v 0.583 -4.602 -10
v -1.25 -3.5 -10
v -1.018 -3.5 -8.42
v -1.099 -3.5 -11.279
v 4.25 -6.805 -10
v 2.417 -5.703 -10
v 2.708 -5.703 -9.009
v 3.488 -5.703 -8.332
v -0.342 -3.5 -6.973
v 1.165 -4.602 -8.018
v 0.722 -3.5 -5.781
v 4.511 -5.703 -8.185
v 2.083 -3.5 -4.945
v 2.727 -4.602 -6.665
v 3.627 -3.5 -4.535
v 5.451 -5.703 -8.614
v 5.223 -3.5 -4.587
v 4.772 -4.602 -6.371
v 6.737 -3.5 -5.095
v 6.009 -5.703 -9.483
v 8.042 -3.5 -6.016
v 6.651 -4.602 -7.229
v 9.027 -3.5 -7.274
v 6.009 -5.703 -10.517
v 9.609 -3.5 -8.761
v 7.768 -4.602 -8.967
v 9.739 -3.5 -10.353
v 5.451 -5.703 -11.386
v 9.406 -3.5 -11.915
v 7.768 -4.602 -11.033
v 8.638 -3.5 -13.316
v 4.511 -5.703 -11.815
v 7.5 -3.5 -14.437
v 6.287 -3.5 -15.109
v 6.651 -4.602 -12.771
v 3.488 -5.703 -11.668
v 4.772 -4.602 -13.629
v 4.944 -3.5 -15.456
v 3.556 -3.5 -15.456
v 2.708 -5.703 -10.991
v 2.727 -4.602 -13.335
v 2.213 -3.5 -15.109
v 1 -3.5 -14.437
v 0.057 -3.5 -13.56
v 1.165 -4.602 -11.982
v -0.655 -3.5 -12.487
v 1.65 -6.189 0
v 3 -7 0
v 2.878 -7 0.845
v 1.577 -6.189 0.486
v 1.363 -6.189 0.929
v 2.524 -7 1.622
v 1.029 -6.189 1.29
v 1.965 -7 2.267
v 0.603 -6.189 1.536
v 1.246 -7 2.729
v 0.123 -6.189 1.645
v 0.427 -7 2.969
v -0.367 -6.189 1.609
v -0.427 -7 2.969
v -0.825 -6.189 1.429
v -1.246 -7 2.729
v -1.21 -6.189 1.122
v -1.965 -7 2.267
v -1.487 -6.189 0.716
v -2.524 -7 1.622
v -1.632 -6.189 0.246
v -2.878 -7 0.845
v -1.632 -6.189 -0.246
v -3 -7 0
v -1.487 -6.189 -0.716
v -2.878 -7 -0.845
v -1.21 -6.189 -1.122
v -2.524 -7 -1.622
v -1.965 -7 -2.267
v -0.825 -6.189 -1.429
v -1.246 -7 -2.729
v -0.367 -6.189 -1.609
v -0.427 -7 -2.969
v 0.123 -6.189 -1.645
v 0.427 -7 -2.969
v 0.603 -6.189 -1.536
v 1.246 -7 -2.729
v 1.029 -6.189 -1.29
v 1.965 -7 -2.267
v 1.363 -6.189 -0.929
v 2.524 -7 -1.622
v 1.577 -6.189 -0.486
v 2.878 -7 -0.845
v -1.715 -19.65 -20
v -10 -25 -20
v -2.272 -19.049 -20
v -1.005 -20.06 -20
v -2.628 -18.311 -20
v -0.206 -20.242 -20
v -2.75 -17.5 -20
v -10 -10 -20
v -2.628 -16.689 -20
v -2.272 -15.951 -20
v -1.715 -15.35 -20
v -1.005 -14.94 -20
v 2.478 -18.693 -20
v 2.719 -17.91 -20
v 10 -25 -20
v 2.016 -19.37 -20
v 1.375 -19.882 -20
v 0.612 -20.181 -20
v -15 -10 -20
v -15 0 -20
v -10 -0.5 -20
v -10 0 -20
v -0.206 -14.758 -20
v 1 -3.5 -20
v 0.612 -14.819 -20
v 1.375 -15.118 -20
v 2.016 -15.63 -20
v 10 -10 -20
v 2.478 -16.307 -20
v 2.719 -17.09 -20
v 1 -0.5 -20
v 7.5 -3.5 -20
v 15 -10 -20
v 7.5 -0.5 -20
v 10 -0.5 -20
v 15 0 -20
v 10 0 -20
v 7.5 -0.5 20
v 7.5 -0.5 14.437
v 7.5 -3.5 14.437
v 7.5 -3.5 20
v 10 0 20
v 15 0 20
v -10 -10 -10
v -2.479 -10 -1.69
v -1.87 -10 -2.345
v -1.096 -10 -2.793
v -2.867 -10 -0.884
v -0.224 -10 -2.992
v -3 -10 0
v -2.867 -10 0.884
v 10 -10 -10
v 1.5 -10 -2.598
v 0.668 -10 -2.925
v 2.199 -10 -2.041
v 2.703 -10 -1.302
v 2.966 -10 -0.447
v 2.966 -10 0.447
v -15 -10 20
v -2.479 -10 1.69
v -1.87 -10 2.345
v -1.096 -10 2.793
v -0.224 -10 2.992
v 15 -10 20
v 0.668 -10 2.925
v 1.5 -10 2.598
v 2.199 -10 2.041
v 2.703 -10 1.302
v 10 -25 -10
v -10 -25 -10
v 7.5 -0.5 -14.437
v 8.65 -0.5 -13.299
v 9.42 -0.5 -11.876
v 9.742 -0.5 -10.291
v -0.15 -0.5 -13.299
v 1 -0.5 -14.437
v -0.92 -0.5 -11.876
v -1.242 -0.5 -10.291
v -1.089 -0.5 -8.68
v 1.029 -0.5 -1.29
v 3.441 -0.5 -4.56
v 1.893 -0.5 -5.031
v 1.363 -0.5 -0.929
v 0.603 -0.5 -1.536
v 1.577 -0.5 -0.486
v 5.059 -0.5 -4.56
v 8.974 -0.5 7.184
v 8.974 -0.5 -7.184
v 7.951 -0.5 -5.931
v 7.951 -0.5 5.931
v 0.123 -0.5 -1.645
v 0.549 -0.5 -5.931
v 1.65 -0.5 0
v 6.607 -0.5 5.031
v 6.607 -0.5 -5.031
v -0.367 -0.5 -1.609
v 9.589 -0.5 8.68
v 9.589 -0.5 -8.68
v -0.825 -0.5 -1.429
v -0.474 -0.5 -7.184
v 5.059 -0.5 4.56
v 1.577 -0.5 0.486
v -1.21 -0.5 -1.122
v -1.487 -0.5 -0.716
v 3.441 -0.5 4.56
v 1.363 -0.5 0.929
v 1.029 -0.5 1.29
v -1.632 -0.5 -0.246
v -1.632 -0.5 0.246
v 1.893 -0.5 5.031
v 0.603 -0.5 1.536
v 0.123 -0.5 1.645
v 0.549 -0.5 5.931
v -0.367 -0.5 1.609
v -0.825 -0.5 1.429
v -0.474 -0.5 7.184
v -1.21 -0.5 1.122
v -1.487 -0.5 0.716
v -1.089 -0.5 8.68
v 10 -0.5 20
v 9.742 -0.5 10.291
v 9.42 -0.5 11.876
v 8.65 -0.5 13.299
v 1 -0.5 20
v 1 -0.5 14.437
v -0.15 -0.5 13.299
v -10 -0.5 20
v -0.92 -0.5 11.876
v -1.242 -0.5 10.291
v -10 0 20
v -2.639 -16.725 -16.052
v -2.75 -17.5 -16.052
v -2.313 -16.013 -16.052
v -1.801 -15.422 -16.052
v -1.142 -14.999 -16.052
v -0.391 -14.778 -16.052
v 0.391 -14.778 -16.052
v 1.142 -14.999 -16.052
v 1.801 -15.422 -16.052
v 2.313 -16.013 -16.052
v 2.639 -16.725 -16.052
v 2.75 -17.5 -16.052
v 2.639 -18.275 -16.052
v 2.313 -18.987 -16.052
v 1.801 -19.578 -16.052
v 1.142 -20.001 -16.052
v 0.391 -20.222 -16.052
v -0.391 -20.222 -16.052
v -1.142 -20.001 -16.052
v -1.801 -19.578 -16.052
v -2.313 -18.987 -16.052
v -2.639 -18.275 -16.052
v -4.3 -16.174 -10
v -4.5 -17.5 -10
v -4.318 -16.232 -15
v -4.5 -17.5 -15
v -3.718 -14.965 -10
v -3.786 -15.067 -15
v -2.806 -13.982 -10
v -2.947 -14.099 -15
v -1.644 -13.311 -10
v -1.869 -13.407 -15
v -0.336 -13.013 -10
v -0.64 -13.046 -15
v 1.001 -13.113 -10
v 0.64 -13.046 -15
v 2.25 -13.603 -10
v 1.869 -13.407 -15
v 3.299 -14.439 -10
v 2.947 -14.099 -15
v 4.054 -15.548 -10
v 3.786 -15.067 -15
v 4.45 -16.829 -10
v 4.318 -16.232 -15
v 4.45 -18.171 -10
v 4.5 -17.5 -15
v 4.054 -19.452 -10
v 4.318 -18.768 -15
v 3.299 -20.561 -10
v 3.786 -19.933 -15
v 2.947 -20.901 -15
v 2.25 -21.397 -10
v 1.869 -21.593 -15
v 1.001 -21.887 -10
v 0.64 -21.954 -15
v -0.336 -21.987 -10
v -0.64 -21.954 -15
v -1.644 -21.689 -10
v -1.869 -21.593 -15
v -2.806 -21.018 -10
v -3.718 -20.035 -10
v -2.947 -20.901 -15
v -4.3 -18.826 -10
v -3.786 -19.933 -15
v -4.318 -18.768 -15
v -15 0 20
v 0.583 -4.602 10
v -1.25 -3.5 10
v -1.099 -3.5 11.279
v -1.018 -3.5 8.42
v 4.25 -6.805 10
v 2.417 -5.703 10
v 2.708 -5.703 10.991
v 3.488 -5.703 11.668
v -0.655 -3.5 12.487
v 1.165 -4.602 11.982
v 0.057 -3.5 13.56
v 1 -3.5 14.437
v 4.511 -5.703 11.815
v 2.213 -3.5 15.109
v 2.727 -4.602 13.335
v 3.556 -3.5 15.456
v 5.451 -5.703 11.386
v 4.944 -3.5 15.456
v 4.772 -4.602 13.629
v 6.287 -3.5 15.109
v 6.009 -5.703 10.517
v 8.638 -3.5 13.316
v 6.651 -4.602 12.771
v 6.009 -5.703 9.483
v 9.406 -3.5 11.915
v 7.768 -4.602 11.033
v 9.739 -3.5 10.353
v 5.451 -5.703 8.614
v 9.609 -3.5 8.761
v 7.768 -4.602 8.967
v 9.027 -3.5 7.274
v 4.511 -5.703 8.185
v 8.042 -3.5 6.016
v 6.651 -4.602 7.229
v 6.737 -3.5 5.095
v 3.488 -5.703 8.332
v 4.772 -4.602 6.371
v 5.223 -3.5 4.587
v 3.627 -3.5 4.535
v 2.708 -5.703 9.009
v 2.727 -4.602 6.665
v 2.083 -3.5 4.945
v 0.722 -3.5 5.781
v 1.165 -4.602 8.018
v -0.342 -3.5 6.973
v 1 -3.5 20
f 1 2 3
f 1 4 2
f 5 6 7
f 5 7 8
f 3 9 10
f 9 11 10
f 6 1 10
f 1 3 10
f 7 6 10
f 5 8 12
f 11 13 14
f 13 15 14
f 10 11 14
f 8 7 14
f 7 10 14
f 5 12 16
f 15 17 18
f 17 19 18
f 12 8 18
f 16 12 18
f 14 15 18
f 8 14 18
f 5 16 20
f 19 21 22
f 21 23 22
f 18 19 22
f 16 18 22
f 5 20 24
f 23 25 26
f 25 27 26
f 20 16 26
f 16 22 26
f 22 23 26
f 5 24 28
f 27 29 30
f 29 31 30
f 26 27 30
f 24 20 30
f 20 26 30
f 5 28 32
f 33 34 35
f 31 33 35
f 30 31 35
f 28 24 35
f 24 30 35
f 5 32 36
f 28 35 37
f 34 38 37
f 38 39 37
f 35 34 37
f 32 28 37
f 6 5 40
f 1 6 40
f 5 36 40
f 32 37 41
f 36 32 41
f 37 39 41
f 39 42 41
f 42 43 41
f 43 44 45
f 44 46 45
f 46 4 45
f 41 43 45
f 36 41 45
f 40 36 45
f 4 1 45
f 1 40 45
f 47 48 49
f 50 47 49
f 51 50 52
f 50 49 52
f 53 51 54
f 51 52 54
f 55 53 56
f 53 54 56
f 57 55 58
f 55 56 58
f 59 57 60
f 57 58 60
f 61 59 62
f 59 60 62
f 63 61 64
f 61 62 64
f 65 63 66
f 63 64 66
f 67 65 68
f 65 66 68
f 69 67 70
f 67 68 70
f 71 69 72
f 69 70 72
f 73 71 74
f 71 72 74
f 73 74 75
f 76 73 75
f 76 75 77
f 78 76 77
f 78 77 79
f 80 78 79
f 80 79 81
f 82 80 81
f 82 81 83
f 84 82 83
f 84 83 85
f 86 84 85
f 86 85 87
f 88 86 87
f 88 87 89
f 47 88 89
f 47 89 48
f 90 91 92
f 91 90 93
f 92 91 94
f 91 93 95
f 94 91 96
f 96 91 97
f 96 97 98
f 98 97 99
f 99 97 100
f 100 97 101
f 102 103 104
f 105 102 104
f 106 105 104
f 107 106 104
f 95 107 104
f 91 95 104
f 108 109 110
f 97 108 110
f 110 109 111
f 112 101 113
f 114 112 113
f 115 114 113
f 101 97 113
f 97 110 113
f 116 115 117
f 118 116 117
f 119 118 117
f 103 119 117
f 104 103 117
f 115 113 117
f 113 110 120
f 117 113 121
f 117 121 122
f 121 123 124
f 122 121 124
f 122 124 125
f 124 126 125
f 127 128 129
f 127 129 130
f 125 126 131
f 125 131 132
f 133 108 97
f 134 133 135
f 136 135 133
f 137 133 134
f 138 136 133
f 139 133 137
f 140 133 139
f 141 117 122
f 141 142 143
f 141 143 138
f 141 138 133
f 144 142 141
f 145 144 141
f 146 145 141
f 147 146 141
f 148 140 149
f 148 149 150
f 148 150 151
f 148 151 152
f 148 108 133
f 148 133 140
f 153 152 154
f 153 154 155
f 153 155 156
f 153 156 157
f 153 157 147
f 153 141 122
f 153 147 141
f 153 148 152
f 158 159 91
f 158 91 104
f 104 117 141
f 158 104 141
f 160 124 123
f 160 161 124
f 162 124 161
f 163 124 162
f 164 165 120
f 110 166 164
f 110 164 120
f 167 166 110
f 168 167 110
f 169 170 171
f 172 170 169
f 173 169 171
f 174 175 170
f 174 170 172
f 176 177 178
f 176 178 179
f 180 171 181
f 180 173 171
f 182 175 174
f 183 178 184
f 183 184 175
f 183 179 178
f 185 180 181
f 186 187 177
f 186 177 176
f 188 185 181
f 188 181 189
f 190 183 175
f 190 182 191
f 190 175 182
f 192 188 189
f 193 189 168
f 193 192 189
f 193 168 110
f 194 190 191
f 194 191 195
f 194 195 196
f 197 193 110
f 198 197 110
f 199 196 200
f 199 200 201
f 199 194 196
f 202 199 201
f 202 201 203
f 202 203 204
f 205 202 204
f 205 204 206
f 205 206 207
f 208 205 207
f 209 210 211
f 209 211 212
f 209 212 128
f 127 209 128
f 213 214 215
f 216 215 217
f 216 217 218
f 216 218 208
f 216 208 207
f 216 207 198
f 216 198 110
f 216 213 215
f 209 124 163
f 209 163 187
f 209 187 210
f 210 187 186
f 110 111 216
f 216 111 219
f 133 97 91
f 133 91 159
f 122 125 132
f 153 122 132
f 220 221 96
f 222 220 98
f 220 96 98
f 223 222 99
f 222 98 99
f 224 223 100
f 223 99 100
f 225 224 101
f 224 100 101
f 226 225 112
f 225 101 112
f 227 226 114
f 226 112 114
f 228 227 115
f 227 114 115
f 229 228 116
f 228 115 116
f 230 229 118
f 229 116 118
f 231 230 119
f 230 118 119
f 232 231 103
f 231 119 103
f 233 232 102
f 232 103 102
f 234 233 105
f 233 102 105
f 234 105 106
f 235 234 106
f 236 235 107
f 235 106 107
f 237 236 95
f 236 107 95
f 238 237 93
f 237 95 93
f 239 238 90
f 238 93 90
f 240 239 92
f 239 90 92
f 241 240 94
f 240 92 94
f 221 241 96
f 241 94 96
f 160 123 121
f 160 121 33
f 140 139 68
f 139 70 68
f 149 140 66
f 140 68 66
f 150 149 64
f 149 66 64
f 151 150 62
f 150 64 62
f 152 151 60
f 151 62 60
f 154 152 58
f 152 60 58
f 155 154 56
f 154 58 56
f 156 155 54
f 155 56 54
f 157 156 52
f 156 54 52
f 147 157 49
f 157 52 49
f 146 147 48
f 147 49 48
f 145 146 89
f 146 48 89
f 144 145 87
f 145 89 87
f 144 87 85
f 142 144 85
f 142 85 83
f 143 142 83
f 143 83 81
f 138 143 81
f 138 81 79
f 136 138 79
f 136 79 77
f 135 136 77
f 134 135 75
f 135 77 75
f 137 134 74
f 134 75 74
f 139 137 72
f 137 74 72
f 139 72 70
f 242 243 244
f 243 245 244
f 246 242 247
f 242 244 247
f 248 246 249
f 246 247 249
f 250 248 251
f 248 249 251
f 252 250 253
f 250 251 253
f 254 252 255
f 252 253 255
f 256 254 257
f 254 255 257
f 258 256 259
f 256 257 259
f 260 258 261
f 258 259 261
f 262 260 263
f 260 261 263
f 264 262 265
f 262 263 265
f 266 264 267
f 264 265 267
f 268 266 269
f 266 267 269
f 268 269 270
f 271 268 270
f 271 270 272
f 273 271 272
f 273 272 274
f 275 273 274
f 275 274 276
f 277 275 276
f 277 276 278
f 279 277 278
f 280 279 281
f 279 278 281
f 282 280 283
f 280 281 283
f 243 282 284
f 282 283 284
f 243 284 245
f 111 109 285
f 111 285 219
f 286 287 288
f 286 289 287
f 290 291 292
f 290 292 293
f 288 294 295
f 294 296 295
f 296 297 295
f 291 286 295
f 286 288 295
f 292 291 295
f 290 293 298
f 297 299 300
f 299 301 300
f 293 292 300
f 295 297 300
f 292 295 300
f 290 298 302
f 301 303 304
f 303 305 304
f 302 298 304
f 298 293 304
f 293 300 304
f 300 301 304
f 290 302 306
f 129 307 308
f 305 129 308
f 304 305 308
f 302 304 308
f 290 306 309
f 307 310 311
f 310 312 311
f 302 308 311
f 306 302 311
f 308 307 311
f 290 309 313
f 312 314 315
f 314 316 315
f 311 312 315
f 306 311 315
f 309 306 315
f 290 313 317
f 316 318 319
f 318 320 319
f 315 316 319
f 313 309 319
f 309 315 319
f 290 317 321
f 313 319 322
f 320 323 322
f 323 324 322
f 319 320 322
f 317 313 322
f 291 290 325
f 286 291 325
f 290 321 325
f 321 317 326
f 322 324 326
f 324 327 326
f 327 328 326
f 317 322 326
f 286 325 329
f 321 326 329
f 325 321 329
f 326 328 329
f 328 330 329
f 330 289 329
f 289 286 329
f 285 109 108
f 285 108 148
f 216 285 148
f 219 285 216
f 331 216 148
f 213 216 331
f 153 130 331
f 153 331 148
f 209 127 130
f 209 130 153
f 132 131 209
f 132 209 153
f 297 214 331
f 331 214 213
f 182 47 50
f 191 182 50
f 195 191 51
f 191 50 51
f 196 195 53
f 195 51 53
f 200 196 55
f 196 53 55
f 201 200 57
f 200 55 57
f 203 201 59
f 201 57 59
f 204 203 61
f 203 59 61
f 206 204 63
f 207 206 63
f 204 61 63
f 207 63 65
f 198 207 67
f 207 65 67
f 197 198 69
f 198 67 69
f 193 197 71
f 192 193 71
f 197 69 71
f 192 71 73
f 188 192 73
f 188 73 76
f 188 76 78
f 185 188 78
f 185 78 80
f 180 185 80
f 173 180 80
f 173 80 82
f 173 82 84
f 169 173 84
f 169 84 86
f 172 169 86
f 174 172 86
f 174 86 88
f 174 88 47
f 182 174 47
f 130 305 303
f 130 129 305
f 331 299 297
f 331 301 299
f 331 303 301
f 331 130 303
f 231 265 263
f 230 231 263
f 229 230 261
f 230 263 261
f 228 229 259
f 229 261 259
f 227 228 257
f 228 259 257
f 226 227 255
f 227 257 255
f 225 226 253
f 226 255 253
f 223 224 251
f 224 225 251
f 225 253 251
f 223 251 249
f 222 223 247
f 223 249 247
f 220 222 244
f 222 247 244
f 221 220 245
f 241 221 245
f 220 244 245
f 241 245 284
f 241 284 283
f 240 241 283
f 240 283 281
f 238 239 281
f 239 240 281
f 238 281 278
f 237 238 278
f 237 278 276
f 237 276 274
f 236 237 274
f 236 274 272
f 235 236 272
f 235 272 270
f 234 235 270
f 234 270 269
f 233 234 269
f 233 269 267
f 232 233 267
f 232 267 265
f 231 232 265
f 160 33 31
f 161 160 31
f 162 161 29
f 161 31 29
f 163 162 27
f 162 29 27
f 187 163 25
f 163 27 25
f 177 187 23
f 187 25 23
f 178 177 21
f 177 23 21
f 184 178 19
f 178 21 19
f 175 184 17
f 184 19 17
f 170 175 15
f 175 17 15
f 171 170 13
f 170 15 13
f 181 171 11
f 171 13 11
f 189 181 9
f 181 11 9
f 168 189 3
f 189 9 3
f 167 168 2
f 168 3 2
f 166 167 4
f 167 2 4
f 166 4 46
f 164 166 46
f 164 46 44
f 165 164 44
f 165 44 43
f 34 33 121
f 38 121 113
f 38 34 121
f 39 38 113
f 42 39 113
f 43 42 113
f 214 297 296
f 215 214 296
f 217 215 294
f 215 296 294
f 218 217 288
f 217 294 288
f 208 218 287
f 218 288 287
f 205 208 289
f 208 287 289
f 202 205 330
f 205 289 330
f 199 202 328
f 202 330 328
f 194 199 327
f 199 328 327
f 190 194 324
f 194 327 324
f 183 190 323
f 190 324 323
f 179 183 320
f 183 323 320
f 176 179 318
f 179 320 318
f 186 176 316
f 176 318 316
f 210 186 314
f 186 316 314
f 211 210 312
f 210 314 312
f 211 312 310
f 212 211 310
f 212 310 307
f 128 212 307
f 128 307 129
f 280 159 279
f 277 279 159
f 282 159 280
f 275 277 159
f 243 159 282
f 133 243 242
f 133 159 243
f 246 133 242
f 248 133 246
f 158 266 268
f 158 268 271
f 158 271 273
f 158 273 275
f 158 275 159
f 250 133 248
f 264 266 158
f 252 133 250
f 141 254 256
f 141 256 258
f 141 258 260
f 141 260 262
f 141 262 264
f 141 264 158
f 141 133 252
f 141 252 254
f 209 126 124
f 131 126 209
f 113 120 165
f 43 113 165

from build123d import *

# Parameters (mm, degrees)
F0_W      = 30
F0_H      = 40
F1_DEPTH  = 10
F2_W      = 20
F2_H      = 40
F3_DEPTH  = 0.5
F4_W      = 6.5
F4_H      = 10
F5_DEPTH  = 3
F6_W      = 6.5
F6_H      = 10
F7_DEPTH  = 3
F8_W      = 20
F8_H      = 10
F9_DEPTH  = 15
F11_D     = 5.5
F13_D     = 9
F13_DEPTH = 5
F13_TIP   = 2.7038727856
F15_D     = 11
F15_DEPTH = 3
F15_TIP   = 3.3047334047
F17_D     = 11
F17_DEPTH = 3
F17_TIP   = 3.3047334047
F19_D     = 3.3
F19_DEPTH = 30
F19_TIP   = 0.9914200214
F21_D     = 6
F21_DEPTH = 3
F21_TIP   = 1.8025818571


with BuildPart() as f1:
    # F0 (on Front) → F1 (new body)
    with BuildSketch(Plane.XZ):
        Rectangle(F0_W, F0_H)
    extrude(amount=F1_DEPTH)

    # F2 (on face) → F3 (cut)
    with BuildSketch(Plane(origin=(0, 0, 0), x_dir=(-1, 0, 0), z_dir=(0, 1, 0))):
        Rectangle(F2_W, F2_H)
    extrude(amount=-F3_DEPTH, mode=Mode.SUBTRACT)

    # F4 (on face) → F5 (cut)
    with BuildSketch(Plane(origin=(0, -0.5, 0), x_dir=(-1, 0, 0), z_dir=(0, 1, 0))):
        with Locations((-4.25, 15)):
            Rectangle(F4_W, F4_H)
    extrude(amount=-F5_DEPTH, mode=Mode.SUBTRACT)

    # F6 (on face) → F7 (cut)
    with BuildSketch(Plane(origin=(0, -0.5, 0), x_dir=(-1, 0, 0), z_dir=(0, 1, 0))):
        with Locations((-4.25, -15)):
            Rectangle(F6_W, F6_H)
    extrude(amount=-F7_DEPTH, mode=Mode.SUBTRACT)

    # F8 (on face) → F9 (join)
    with BuildSketch(Plane.XZ.offset(10)):
        with Locations((0, -15)):
            Rectangle(F8_W, F8_H)
    extrude(amount=F9_DEPTH)

    # F11 (through all)
    with Locations(Plane.XY.offset(-10)):
        with Locations((0, -17.5)):
            Hole(F11_D / 2)

    # F13
    with Locations(Plane.XY.offset(-10)):
        with Locations((0, -17.5)):
            Hole(F13_D / 2, depth=F13_DEPTH)
            with Locations((0, 0, -(F13_DEPTH + F13_TIP / 2))):  # 118° drill point
                Cone(0, F13_D / 2, F13_TIP, mode=Mode.SUBTRACT)

    # F15
    with Locations(Plane(origin=(0, -0.5, 0), x_dir=(-1, 0, 0), z_dir=(0, 1, 0))):
        with Locations((-4.25, 10)):
            Hole(F15_D / 2, depth=F15_DEPTH)
            with Locations((0, 0, -(F15_DEPTH + F15_TIP / 2))):  # 118° drill point
                Cone(0, F15_D / 2, F15_TIP, mode=Mode.SUBTRACT)

    # F17
    with Locations(Plane(origin=(0, -0.5, 0), x_dir=(-1, 0, 0), z_dir=(0, 1, 0))):
        with Locations((-4.25, -10)):
            Hole(F17_D / 2, depth=F17_DEPTH)
            with Locations((0, 0, -(F17_DEPTH + F17_TIP / 2))):  # 118° drill point
                Cone(0, F17_D / 2, F17_TIP, mode=Mode.SUBTRACT)

    # F19
    with Locations(Plane(origin=(0, -0.5, 0), x_dir=(-1, 0, 0), z_dir=(0, 1, 0))):
        with Locations((0, 0)):
            Hole(F19_D / 2, depth=F19_DEPTH)
            with Locations((0, 0, -(F19_DEPTH + F19_TIP / 2))):  # 118° drill point
                Cone(0, F19_D / 2, F19_TIP, mode=Mode.SUBTRACT)

    # F21
    with Locations(Plane.XZ.offset(10)):
        with Locations((0, 0)):
            Hole(F21_D / 2, depth=F21_DEPTH)
            with Locations((0, 0, -(F21_DEPTH + F21_TIP / 2))):  # 118° drill point
                Cone(0, F21_D / 2, F21_TIP, mode=Mode.SUBTRACT)


solid = f1.part
